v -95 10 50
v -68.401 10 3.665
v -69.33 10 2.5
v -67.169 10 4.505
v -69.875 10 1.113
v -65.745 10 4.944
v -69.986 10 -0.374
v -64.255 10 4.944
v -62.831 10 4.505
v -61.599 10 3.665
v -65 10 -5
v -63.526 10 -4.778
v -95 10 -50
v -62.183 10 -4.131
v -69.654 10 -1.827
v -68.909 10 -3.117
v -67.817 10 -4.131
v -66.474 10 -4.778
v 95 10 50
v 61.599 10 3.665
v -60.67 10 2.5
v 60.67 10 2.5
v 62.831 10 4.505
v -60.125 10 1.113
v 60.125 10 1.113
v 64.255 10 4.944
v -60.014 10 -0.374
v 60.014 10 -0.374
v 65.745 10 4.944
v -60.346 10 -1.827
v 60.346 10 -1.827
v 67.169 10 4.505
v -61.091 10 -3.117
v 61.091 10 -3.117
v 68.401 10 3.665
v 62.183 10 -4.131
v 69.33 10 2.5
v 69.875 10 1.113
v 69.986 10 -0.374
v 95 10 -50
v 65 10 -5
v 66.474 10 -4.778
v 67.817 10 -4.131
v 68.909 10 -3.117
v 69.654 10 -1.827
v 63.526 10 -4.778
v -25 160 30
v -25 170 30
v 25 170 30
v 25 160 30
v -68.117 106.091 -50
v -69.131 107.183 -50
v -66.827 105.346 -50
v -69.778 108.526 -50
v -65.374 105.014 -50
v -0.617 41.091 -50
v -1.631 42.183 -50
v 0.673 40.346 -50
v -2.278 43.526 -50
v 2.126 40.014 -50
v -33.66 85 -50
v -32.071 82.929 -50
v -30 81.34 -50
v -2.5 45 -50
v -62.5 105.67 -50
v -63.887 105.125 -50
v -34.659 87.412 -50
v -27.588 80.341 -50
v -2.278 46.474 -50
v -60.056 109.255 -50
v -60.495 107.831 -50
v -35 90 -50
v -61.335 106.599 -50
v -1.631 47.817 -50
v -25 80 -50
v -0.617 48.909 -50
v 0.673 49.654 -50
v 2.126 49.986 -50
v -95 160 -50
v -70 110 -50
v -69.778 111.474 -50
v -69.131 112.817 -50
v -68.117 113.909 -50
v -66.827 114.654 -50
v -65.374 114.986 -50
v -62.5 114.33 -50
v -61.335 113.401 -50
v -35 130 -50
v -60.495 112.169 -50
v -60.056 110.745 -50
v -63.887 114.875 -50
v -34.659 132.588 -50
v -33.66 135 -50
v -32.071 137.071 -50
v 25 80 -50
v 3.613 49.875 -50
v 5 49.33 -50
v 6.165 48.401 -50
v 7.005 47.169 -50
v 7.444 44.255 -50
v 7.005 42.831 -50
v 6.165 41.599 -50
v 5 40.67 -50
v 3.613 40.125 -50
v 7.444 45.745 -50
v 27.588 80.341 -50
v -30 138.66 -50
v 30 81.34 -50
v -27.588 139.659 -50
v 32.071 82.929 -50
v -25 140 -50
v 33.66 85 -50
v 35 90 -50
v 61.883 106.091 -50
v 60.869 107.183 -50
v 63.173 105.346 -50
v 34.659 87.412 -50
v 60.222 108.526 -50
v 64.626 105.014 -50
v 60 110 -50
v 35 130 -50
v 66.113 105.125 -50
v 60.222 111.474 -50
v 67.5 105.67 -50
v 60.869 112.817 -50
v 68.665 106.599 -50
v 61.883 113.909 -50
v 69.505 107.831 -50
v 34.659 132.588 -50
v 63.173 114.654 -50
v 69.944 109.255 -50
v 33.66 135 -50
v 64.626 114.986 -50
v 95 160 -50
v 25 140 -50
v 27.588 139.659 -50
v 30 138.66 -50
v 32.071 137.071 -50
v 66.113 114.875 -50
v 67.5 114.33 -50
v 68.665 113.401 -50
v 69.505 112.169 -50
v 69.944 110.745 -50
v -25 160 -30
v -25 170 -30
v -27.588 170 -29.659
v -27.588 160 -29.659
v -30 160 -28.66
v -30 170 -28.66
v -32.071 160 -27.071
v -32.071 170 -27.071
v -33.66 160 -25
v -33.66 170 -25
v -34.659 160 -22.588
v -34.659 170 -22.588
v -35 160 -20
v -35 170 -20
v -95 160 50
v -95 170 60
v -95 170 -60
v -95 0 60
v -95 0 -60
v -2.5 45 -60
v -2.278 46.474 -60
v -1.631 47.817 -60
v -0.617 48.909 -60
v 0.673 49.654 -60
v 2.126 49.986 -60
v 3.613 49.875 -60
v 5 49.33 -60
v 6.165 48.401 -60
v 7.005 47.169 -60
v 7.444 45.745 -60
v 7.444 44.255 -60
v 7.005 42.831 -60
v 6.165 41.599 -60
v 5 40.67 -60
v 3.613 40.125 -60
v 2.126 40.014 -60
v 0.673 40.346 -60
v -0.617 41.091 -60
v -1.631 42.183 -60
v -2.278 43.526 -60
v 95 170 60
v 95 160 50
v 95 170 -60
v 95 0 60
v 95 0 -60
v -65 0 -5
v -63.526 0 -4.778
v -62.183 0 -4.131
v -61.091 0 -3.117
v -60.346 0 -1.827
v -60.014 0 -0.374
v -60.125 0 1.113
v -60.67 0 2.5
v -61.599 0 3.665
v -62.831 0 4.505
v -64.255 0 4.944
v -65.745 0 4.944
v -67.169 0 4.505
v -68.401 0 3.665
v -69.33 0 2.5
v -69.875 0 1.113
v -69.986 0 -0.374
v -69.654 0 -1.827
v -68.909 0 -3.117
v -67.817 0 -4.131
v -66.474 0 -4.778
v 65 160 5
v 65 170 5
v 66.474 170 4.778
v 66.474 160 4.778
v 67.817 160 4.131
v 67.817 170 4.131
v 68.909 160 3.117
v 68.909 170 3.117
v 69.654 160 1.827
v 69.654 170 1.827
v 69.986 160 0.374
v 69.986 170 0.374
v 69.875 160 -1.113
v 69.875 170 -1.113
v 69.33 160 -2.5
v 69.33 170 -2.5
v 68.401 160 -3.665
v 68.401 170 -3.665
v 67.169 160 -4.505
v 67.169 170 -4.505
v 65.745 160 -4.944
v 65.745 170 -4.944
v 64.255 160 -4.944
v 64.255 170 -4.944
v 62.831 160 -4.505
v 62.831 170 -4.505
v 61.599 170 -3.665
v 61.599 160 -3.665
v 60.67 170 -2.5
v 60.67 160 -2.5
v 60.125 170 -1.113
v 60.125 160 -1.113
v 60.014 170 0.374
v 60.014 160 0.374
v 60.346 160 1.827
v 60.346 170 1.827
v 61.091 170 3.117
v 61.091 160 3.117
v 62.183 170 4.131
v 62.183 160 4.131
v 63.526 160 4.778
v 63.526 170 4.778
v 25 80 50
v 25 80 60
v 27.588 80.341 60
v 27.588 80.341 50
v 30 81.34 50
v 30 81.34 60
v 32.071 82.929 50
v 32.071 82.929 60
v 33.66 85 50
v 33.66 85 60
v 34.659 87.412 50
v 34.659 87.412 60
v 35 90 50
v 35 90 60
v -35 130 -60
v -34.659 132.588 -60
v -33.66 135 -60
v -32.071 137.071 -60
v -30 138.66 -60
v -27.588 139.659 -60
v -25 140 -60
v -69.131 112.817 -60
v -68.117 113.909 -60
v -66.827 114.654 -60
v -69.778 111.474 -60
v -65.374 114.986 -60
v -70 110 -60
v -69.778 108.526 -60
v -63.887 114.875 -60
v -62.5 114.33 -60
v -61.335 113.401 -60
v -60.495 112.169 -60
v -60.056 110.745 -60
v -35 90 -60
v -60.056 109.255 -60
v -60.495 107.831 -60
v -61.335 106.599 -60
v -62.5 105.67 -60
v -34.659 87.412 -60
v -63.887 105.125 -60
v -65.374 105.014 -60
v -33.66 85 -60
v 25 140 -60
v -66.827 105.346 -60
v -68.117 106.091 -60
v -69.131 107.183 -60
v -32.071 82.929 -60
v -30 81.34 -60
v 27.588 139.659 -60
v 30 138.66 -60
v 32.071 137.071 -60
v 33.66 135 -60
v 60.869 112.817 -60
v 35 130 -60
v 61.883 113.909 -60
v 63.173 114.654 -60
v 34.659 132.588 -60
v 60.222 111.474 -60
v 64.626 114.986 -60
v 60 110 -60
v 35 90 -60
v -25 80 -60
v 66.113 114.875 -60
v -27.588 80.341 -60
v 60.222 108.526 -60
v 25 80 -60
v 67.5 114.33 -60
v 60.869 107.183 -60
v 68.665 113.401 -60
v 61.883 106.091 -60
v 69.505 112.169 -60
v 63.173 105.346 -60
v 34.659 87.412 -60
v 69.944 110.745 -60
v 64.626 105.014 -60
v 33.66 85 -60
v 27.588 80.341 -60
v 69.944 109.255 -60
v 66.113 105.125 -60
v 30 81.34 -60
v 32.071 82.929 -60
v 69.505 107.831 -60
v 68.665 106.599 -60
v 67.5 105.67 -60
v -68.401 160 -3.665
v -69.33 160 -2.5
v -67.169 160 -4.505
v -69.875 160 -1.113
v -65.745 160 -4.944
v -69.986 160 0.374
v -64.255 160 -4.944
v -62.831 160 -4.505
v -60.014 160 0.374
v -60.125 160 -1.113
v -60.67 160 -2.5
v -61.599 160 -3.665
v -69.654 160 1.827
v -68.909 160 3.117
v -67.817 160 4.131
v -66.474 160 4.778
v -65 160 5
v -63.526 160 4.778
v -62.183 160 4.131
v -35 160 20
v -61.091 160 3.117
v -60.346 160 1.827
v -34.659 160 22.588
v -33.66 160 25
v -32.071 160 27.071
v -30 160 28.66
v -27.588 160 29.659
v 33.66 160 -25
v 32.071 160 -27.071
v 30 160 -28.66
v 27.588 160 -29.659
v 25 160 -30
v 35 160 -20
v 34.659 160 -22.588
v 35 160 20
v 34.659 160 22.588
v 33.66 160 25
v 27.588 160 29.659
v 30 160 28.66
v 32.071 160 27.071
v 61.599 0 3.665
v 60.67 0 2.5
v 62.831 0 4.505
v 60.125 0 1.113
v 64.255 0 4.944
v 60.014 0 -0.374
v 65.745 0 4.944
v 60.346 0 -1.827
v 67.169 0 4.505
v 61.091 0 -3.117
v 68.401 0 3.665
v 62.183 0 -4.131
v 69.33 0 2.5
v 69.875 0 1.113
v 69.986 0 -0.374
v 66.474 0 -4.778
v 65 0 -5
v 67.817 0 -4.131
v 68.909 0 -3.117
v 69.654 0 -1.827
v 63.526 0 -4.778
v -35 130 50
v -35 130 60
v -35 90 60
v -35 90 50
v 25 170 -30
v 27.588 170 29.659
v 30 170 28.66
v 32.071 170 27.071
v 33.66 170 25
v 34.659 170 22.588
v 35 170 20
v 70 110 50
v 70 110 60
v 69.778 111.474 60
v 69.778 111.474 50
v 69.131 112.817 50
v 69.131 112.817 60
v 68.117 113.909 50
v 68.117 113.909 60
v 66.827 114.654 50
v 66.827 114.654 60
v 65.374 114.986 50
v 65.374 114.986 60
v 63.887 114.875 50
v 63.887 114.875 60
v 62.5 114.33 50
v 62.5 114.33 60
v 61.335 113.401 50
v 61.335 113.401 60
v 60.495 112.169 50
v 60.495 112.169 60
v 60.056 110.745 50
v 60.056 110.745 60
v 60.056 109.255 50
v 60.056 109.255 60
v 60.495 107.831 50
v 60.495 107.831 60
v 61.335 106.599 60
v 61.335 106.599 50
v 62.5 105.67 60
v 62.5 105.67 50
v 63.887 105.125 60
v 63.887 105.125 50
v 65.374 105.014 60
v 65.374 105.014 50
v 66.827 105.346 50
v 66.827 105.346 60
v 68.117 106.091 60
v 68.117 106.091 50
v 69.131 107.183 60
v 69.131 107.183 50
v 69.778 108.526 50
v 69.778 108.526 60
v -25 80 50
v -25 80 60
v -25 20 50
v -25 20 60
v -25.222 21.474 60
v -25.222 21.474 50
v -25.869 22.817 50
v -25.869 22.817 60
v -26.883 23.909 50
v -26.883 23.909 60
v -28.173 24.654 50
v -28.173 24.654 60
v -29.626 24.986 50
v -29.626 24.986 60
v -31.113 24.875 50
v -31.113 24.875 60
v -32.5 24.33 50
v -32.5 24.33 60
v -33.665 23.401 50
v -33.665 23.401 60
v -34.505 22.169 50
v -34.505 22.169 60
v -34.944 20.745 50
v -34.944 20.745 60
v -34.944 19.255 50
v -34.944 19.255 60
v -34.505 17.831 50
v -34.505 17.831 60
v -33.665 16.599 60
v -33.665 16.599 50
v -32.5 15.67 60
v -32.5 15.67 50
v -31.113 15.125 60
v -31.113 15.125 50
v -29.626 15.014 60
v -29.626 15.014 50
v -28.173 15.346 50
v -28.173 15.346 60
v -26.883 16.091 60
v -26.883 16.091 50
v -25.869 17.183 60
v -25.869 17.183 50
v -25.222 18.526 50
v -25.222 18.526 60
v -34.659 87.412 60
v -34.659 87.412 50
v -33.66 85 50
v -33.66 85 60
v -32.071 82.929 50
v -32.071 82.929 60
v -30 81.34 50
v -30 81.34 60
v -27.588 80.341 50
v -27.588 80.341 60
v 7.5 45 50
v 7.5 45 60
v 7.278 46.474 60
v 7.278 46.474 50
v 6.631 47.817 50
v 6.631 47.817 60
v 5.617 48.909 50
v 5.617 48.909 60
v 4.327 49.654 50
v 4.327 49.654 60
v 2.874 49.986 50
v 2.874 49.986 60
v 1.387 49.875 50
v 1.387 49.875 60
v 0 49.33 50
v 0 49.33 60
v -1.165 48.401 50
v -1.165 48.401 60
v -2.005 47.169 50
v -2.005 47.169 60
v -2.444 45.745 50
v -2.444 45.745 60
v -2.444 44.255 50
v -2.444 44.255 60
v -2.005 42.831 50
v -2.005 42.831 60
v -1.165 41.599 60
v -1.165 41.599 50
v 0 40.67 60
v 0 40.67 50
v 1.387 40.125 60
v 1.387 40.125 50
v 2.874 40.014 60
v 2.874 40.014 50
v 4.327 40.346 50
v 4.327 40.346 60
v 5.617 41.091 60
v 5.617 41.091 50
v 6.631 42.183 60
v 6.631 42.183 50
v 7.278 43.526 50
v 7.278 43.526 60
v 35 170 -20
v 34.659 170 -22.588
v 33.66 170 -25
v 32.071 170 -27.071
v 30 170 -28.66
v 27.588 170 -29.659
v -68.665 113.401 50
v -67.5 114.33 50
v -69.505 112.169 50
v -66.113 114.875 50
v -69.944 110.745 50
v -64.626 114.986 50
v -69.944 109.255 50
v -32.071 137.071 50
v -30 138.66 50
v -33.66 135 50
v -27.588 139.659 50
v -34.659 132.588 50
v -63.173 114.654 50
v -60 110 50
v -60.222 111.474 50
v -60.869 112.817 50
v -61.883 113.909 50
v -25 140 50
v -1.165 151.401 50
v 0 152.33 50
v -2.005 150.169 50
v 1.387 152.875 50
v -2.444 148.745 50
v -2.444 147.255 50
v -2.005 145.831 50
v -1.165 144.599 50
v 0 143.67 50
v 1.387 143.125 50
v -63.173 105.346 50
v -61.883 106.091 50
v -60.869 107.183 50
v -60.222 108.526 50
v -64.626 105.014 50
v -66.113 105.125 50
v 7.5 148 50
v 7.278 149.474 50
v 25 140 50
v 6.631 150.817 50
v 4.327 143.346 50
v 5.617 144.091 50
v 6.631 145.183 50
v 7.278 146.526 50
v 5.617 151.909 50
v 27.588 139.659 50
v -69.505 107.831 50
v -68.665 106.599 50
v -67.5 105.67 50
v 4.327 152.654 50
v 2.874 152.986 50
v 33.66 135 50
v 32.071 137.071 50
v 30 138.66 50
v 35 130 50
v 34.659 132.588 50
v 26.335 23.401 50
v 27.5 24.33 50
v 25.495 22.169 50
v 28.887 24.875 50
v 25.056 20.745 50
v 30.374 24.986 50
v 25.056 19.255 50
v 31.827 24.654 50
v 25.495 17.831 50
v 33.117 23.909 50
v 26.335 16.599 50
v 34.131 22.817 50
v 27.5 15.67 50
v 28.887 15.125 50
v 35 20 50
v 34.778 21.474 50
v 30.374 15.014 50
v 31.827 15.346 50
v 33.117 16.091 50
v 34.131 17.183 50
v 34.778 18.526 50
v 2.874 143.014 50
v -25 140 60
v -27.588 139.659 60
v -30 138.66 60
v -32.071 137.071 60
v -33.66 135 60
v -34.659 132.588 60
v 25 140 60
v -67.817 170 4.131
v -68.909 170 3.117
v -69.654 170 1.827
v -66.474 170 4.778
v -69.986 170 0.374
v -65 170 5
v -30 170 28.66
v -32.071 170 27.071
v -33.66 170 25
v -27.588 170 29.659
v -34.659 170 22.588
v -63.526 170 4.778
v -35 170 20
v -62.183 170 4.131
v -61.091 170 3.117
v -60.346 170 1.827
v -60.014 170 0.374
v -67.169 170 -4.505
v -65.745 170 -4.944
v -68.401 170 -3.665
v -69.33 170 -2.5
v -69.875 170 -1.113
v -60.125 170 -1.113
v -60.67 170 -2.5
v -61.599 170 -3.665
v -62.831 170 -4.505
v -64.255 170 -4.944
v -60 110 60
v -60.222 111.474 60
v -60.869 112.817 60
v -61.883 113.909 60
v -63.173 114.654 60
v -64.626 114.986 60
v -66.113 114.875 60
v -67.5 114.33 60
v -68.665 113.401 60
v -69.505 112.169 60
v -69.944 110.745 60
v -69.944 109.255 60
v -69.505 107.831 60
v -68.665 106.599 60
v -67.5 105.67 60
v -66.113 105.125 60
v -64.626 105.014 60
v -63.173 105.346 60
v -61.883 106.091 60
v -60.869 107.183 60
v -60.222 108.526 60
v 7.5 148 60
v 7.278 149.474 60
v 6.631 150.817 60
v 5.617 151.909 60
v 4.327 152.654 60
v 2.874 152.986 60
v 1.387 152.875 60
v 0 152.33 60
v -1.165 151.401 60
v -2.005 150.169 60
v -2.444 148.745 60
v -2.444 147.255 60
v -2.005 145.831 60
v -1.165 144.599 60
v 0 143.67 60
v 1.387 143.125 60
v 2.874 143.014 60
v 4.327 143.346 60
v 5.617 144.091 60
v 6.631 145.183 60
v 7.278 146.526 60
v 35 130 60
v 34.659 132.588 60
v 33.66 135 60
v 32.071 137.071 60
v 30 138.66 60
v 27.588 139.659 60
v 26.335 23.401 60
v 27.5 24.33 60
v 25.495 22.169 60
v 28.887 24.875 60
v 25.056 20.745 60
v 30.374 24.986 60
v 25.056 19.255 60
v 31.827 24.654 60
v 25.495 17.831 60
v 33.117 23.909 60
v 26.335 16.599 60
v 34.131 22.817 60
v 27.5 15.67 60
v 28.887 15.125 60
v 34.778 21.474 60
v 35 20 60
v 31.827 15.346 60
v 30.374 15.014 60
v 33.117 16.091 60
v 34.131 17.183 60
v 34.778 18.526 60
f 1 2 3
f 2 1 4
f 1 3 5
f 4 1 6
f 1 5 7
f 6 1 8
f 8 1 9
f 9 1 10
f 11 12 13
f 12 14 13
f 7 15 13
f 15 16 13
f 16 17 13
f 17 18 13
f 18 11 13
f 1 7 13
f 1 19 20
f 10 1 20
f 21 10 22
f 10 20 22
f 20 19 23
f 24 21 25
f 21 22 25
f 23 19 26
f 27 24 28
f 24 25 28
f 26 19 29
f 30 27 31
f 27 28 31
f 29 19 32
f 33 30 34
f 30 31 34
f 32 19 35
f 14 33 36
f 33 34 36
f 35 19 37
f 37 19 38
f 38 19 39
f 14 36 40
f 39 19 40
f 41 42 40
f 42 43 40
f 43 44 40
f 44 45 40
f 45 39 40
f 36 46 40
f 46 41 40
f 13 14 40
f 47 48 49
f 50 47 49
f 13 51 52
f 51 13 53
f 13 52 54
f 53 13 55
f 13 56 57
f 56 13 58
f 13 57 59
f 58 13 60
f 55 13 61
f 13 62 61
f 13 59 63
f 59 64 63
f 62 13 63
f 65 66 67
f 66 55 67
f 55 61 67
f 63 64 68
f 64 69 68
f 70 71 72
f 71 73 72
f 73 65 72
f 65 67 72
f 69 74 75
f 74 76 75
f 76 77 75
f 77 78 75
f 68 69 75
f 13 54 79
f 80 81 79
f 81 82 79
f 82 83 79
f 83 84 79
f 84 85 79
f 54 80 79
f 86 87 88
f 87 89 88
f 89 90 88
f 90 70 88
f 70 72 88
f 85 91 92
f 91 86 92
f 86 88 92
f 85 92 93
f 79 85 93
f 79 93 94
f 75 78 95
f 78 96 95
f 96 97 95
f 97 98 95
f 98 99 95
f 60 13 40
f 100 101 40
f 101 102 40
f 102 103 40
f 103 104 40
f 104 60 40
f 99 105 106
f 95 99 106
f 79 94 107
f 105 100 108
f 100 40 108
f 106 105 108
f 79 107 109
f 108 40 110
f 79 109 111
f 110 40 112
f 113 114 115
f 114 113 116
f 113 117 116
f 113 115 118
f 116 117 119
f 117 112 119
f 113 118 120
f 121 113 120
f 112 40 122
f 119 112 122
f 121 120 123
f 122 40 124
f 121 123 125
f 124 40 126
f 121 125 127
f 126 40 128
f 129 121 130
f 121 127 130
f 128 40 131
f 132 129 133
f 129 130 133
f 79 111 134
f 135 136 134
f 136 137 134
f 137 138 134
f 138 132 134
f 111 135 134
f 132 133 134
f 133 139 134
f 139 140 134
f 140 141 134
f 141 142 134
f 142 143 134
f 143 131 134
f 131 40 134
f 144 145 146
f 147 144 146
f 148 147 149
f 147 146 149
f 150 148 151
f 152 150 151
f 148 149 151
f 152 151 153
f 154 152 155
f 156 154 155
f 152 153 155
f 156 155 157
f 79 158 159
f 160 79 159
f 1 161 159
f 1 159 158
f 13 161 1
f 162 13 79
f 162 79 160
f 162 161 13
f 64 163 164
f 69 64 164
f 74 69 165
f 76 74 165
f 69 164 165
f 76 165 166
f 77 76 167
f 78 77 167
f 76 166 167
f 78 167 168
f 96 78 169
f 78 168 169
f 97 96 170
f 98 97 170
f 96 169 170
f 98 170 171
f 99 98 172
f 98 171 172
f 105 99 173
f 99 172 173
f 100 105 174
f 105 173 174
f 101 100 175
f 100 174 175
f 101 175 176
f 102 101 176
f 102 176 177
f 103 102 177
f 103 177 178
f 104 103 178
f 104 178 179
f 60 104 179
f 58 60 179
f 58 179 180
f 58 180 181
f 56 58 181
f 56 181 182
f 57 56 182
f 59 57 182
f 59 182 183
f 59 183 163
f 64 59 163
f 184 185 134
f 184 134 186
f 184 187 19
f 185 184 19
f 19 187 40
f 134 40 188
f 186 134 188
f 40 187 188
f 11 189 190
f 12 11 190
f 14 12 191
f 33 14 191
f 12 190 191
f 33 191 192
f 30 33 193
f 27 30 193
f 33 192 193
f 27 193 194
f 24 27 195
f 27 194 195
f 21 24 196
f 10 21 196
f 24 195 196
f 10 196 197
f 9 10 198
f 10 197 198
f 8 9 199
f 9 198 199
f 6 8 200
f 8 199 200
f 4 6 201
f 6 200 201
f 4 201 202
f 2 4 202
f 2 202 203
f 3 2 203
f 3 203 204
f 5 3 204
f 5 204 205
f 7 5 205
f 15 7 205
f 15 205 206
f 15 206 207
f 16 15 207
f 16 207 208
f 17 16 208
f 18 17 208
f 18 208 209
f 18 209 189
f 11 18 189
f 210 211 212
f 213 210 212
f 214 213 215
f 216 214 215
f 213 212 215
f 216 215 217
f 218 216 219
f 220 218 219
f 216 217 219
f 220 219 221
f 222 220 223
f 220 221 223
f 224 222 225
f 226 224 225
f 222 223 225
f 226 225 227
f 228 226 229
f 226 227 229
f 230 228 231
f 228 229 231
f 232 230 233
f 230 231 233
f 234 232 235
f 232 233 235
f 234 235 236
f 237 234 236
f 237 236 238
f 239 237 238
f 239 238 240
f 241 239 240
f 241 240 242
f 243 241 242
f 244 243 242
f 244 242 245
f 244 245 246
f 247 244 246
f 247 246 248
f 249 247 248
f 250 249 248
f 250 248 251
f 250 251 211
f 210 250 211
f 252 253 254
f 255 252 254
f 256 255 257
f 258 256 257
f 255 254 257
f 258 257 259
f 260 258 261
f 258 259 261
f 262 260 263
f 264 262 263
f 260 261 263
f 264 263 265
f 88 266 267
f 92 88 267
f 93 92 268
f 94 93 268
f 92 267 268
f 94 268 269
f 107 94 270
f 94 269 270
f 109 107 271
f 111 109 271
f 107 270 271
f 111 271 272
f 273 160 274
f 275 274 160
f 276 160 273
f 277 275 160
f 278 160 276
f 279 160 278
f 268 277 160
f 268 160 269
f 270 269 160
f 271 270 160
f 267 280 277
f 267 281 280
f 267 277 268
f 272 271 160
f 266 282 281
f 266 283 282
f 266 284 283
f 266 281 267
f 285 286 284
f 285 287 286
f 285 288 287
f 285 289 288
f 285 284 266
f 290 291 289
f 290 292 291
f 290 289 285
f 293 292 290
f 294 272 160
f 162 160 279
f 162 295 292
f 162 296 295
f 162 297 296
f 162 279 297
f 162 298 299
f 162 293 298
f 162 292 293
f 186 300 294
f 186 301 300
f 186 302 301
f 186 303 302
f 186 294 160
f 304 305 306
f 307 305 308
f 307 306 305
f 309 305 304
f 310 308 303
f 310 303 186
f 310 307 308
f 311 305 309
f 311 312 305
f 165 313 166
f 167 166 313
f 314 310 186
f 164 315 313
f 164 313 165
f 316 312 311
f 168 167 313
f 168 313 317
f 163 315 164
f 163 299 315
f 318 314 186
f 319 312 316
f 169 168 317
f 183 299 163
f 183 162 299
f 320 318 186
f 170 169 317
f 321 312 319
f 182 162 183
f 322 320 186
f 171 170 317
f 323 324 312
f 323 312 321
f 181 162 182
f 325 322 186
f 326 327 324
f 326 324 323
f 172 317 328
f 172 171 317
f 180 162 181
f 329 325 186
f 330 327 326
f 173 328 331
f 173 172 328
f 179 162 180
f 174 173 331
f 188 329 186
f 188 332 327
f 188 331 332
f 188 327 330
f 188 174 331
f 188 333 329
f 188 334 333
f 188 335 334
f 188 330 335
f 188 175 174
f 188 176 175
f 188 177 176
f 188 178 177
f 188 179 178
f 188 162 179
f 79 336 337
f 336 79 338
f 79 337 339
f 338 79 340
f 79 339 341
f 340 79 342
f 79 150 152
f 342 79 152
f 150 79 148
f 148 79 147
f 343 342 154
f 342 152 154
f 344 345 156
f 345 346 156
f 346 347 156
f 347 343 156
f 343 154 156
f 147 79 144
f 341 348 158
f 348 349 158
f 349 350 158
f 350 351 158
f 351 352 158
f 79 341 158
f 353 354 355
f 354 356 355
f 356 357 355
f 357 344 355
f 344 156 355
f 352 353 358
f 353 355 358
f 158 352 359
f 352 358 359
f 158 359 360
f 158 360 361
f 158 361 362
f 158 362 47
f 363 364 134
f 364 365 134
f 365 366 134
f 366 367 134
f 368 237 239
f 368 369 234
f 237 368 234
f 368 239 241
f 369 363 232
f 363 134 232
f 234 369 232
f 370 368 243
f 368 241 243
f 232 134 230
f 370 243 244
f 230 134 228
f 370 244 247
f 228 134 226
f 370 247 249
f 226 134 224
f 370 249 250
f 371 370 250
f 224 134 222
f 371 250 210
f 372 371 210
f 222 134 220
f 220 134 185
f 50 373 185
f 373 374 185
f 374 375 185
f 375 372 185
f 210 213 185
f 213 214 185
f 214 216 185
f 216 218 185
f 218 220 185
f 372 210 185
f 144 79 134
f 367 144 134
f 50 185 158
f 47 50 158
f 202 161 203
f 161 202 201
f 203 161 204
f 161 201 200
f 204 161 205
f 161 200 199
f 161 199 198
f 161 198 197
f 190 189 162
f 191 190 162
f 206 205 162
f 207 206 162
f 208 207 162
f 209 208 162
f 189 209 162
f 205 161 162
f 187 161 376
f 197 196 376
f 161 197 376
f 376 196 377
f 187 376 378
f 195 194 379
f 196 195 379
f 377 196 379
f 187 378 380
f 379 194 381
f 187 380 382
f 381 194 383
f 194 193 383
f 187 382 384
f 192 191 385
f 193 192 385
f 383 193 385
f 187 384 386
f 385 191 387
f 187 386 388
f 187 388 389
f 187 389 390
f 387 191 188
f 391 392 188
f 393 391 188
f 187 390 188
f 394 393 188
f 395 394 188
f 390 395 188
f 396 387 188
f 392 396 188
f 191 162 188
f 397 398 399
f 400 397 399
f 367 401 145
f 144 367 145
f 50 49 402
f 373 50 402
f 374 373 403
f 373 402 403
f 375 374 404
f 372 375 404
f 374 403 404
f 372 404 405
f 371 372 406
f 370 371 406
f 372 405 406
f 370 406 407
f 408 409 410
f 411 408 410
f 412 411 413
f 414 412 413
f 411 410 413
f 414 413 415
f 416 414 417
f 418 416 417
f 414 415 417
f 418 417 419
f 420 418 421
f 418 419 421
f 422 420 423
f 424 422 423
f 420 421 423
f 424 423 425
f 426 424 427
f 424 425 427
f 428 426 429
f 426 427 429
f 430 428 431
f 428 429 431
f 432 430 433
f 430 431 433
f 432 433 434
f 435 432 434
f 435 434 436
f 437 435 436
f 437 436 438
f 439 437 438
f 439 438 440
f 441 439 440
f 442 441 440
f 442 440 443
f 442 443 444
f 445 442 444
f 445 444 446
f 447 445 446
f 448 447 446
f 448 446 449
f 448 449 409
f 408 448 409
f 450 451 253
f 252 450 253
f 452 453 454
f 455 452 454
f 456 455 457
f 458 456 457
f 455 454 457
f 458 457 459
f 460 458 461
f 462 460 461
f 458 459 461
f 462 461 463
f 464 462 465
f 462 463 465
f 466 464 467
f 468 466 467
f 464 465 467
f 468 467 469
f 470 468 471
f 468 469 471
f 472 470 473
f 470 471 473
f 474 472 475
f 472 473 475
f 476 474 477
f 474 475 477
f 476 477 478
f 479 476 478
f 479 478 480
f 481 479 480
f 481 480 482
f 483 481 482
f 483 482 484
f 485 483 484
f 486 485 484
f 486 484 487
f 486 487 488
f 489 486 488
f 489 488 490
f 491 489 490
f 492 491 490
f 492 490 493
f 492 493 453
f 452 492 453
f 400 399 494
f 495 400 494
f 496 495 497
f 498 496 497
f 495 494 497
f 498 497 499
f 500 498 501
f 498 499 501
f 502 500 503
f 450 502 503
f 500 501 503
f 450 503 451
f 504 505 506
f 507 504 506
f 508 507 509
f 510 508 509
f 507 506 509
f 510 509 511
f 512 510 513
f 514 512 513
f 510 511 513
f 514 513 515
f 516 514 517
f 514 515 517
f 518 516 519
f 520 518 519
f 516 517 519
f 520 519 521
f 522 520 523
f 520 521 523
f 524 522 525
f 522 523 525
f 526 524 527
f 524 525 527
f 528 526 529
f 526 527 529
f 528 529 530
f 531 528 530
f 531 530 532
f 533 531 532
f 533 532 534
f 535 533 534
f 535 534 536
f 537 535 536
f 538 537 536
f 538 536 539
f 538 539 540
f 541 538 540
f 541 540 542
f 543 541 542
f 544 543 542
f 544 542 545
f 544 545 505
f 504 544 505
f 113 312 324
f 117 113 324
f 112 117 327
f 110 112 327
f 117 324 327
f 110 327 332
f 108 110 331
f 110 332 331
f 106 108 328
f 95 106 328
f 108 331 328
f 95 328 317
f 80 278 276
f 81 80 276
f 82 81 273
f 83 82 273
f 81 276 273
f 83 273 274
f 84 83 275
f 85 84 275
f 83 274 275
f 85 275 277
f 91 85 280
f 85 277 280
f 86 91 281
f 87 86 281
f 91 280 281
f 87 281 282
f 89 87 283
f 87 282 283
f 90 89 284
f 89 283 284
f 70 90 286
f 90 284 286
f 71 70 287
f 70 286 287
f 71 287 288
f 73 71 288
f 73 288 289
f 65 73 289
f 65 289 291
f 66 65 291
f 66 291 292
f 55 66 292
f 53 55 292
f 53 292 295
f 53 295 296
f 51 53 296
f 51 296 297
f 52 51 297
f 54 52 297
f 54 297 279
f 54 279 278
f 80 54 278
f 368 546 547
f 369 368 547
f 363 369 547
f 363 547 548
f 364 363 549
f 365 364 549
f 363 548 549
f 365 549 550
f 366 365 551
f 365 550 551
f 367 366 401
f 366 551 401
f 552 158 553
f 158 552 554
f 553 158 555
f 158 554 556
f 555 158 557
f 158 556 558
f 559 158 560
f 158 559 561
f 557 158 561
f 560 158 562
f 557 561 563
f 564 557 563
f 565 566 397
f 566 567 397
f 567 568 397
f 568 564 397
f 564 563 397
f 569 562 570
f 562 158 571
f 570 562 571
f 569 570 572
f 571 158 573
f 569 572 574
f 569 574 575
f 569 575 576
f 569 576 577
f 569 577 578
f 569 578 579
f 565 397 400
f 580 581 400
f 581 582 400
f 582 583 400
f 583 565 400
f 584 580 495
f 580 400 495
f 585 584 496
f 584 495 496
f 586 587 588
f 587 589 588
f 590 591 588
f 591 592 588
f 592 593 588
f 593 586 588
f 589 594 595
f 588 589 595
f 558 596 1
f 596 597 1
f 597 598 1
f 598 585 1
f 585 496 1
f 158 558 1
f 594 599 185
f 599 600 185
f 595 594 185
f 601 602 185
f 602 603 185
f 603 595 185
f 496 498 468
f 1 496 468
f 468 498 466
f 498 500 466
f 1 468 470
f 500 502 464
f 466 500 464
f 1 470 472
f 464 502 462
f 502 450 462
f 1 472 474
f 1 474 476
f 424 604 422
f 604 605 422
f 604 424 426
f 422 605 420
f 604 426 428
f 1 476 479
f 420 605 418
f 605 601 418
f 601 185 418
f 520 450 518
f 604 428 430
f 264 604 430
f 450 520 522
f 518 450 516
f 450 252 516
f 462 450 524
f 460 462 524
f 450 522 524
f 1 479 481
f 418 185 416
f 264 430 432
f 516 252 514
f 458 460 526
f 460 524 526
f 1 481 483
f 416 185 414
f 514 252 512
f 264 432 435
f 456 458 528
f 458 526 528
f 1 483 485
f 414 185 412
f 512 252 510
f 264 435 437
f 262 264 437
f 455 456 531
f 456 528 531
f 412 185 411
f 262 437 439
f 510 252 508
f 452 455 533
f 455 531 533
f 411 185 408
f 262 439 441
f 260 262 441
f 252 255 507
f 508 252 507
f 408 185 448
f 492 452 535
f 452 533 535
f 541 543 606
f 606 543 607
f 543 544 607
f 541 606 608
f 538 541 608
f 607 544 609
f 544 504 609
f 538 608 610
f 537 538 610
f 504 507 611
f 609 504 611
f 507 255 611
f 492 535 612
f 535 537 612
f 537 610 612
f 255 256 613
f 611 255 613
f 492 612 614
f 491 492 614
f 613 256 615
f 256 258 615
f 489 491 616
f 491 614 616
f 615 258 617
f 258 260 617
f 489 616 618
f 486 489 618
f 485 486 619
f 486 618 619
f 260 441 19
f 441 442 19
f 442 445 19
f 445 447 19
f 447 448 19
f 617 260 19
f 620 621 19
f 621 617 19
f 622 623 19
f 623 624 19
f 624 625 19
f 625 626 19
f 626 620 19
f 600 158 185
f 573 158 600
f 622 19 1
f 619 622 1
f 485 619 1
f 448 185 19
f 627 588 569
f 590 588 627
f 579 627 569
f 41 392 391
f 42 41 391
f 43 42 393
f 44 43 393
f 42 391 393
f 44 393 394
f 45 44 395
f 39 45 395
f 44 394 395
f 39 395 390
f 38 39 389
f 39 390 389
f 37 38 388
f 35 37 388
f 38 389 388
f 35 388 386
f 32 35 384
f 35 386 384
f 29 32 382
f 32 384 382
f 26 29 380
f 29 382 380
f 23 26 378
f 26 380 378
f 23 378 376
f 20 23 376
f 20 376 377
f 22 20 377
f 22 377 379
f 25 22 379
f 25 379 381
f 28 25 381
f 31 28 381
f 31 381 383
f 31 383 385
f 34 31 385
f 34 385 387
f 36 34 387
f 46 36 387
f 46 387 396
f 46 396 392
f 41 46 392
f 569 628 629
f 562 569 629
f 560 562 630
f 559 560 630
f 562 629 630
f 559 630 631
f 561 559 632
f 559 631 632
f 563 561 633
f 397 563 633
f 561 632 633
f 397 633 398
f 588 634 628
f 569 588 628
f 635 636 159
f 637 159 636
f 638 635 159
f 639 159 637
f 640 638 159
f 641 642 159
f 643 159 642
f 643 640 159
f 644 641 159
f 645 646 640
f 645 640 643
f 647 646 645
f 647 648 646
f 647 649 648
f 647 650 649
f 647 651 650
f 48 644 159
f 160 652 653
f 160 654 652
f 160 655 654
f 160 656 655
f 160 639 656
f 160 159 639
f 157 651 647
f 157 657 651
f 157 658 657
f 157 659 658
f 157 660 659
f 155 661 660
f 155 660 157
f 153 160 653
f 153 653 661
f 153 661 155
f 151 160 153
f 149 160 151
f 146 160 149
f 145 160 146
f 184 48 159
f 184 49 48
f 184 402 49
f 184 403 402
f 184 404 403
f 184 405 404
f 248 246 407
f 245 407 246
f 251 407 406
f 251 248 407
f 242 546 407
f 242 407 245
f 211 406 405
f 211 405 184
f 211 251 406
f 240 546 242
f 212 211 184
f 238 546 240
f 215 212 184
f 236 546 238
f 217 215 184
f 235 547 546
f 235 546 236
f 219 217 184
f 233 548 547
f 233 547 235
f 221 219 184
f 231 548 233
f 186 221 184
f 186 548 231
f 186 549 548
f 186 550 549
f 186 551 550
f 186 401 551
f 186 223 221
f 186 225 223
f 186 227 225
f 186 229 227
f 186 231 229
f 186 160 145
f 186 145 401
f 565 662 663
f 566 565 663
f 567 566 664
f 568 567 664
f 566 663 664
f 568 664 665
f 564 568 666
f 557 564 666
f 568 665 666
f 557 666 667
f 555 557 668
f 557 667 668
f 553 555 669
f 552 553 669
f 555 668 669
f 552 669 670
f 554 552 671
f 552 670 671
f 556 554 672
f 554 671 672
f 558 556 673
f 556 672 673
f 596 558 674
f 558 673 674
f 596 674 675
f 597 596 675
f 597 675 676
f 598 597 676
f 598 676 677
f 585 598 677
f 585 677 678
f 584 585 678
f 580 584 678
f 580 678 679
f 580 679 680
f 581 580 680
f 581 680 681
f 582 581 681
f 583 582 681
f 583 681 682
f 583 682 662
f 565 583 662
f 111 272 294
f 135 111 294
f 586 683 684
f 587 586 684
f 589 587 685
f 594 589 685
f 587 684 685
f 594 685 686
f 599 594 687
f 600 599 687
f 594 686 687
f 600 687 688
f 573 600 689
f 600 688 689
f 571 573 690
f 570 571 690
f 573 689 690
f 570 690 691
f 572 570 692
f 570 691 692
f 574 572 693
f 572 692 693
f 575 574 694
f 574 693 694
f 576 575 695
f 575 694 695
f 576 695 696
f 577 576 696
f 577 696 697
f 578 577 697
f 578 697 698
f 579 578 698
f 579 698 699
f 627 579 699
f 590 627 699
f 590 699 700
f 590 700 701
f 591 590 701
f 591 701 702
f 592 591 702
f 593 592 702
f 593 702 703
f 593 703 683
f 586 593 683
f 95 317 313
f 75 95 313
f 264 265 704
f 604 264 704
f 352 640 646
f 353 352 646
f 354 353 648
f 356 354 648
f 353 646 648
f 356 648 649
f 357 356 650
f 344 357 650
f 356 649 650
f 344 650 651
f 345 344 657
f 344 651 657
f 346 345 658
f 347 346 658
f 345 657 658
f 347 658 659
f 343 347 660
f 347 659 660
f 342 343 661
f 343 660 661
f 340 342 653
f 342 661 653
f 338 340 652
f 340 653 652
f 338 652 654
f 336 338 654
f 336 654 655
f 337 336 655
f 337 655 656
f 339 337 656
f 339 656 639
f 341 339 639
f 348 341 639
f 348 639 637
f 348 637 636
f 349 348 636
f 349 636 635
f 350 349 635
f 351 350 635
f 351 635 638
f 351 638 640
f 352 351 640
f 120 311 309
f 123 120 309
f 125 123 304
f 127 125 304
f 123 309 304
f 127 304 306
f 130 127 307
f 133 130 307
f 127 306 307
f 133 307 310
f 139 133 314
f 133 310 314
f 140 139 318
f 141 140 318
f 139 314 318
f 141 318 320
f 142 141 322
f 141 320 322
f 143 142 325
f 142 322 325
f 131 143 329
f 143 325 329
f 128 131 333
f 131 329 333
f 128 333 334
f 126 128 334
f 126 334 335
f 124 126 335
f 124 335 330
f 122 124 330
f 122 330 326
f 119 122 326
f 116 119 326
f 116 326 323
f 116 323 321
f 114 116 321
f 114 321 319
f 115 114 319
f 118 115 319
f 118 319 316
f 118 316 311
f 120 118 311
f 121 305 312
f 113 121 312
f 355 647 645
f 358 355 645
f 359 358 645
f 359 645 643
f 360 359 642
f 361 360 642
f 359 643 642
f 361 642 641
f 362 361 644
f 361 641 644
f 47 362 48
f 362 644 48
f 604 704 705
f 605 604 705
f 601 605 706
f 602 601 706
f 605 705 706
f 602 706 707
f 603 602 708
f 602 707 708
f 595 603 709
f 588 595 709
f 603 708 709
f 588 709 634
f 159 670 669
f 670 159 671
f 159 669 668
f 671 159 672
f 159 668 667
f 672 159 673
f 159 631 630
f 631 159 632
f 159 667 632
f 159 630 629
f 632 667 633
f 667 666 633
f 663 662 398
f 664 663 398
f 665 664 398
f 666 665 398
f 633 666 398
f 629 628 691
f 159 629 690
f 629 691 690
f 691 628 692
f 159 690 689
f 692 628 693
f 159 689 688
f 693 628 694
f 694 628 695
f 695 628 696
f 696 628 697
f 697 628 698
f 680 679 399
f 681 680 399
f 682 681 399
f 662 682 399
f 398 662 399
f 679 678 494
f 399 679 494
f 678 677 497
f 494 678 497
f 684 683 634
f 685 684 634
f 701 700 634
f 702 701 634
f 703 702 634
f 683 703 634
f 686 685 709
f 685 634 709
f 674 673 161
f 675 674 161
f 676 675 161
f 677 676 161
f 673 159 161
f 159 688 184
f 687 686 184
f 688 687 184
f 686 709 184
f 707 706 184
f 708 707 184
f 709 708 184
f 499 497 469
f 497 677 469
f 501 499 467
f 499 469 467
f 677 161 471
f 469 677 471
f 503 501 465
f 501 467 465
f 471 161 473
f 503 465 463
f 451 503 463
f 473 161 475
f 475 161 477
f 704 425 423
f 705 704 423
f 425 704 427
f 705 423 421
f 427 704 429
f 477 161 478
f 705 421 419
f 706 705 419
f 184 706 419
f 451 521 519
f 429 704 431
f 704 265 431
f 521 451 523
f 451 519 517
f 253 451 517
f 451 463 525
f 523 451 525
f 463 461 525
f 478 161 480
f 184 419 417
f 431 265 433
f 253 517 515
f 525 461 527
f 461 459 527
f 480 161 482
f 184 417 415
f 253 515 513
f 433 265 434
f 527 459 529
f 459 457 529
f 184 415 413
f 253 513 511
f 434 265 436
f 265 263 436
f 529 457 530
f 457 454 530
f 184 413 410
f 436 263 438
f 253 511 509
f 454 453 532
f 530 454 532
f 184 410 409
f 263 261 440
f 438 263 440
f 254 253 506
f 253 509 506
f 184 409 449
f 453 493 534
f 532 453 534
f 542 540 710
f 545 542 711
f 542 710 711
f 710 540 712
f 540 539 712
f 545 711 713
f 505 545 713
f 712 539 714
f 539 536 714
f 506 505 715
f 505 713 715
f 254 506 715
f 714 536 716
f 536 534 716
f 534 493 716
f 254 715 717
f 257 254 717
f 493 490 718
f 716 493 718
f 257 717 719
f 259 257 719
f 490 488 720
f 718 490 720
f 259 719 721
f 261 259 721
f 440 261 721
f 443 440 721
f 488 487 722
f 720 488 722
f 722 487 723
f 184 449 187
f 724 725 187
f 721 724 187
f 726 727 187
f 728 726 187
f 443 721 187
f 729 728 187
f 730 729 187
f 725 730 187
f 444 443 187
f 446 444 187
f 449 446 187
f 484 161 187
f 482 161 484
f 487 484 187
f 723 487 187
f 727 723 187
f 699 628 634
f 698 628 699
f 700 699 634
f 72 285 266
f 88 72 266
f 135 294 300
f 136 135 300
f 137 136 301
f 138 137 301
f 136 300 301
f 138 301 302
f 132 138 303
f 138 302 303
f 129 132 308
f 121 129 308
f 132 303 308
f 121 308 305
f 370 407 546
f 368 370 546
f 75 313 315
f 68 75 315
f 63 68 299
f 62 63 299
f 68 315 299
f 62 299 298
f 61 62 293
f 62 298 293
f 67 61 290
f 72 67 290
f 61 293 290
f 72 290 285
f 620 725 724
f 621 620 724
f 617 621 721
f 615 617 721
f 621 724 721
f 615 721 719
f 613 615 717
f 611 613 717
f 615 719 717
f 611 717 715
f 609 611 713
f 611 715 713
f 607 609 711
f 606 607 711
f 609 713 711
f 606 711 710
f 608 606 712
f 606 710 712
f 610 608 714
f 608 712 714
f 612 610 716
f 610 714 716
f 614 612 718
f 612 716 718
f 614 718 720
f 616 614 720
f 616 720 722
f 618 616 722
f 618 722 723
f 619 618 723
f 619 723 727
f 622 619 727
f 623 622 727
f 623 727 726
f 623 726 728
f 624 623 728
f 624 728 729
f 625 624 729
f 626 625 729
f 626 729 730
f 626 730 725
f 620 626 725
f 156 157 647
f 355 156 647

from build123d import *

# Parameters (mm, degrees)
SKETCH1_W                        = 190
SKETCH1_H                        = 120
BOSS_EXTRUDE1_DEPTH              = 170
SKETCH2_W                        = 50
SKETCH2_H                        = 75
CUT_EXTRUDE1_DEPTH               = 190
CUT_EXTRUDE2_DEPTH               = 15
CUT_EXTRUDE3_DEPTH               = 15
CUT_EXTRUDE4_DEPTH               = 15
M10X1_0_TAPPED_HOLE1_D           = 9
M10X1_0_TAPPED_HOLE1_DEPTH       = 23
M10X1_0_TAPPED_HOLE1_CBORE_D     = 10
M10X1_0_TAPPED_HOLE1_CBORE_DEPTH = 20
M10X1_0_TAPPED_HOLE1_TIP         = 2.703872786
M10X1_0_TAPPED_HOLE2_D           = 9
M10X1_0_TAPPED_HOLE2_DEPTH       = 23
M10X1_0_TAPPED_HOLE2_CBORE_D     = 10
M10X1_0_TAPPED_HOLE2_CBORE_DEPTH = 20
M10X1_0_TAPPED_HOLE2_TIP         = 2.703872786
M10X1_0_TAPPED_HOLE3_D           = 9
M10X1_0_TAPPED_HOLE3_DEPTH       = 23
M10X1_0_TAPPED_HOLE3_CBORE_D     = 10
M10X1_0_TAPPED_HOLE3_CBORE_DEPTH = 20
M10X1_0_TAPPED_HOLE3_TIP         = 2.703872786
M10X1_0_TAPPED_HOLE4_D           = 9
M10X1_0_TAPPED_HOLE4_DEPTH       = 23
M10X1_0_TAPPED_HOLE4_CBORE_D     = 10
M10X1_0_TAPPED_HOLE4_CBORE_DEPTH = 20
M10X1_0_TAPPED_HOLE4_TIP         = 2.703872786
M10X1_0_TAPPED_HOLE5_D           = 9
M10X1_0_TAPPED_HOLE5_DEPTH       = 23
M10X1_0_TAPPED_HOLE5_CBORE_D     = 10
M10X1_0_TAPPED_HOLE5_CBORE_DEPTH = 20
M10X1_0_TAPPED_HOLE5_TIP         = 2.703872786


with BuildPart() as part:
    # Sketch1 → Boss-Extrude1 (new body)
    with BuildSketch(Plane(origin=(0, 0, 0), x_dir=(1, 0, 0), z_dir=(0, 1, 0))):
        Rectangle(SKETCH1_W, SKETCH1_H)
    extrude(amount=BOSS_EXTRUDE1_DEPTH)

    # Sketch2 → Cut-Extrude1 (cut)
    with BuildSketch(Plane(origin=(95, 0, 0), x_dir=(0, 0, -1), z_dir=(1, 0, 0))):
        with Locations((-25, 122.5)):
            Rectangle(SKETCH2_W, SKETCH2_H)
        with Locations((25, 122.5)):
            Rectangle(SKETCH2_W, SKETCH2_H)
        with Locations((25, 47.5)):
            Rectangle(SKETCH2_W, SKETCH2_H)
        with Locations((-25, 47.5)):
            Rectangle(SKETCH2_W, SKETCH2_H)
    extrude(amount=-CUT_EXTRUDE1_DEPTH, mode=Mode.SUBTRACT)

    # Sketch3 → Cut-Extrude2 (cut)
    with BuildSketch(Plane.XY.offset(60)):
        with BuildLine():
            Line((-25, 80), (25, 80))
            ThreePointArc((25, 80), (32.071067812, 82.928932188), (35, 90))
            Line((35, 90), (35, 130))
            ThreePointArc((35, 130), (32.071067812, 137.071067812), (25, 140))
            Line((25, 140), (-25, 140))
            ThreePointArc((-25, 140), (-32.071067812, 137.071067812), (-35, 130))
            Line((-35, 130), (-35, 90))
            ThreePointArc((-35, 90), (-32.071067812, 82.928932188), (-25, 80))
        make_face()
    extrude(amount=-CUT_EXTRUDE2_DEPTH, mode=Mode.SUBTRACT)

    # Sketch4 → Cut-Extrude3 (cut)
    with BuildSketch(Plane(origin=(0, 0, -60), x_dir=(-1, 0, 0), z_dir=(0, 0, -1))):
        with BuildLine():
            Line((-25, 80), (25, 80))
            ThreePointArc((25, 80), (32.071067812, 82.928932188), (35, 90))
            Line((35, 90), (35, 130))
            ThreePointArc((35, 130), (32.071067812, 137.071067812), (25, 140))
            Line((25, 140), (-25, 140))
            ThreePointArc((-25, 140), (-32.071067812, 137.071067812), (-35, 130))
            Line((-35, 130), (-35, 90))
            ThreePointArc((-35, 90), (-32.071067812, 82.928932188), (-25, 80))
        make_face()
    extrude(amount=-CUT_EXTRUDE3_DEPTH, mode=Mode.SUBTRACT)

    # Sketch5 → Cut-Extrude4 (cut)
    with BuildSketch(Plane(origin=(0, 170, 0), x_dir=(1, 0, 0), z_dir=(0, 1, 0))):
        with BuildLine():
            Line((-25, -30), (25, -30))
            ThreePointArc((25, -30), (32.071067812, -27.071067812), (35, -20))
            Line((35, -20), (35, 20))
            ThreePointArc((35, 20), (32.071067812, 27.071067812), (25, 30))
            Line((25, 30), (-25, 30))
            ThreePointArc((-25, 30), (-32.071067812, 27.071067812), (-35, 20))
            Line((-35, 20), (-35, -20))
            ThreePointArc((-35, -20), (-32.071067812, -27.071067812), (-25, -30))
        make_face()
    extrude(amount=-CUT_EXTRUDE4_DEPTH, mode=Mode.SUBTRACT)

    # M10x1.0 Tapped Hole1
    with Locations(Plane(origin=(65, 110, -70), x_dir=(-1, 0, 0), z_dir=(0, 0, -1))):
        with Locations((0, 0), (130, 0), (62.5, -65)):
            CounterBoreHole(M10X1_0_TAPPED_HOLE1_D / 2, M10X1_0_TAPPED_HOLE1_CBORE_D / 2, M10X1_0_TAPPED_HOLE1_CBORE_DEPTH, depth=M10X1_0_TAPPED_HOLE1_DEPTH)
            with Locations((0, 0, -(M10X1_0_TAPPED_HOLE1_DEPTH + M10X1_0_TAPPED_HOLE1_TIP / 2))):  # 118° drill point
                Cone(0, M10X1_0_TAPPED_HOLE1_D / 2, M10X1_0_TAPPED_HOLE1_TIP, mode=Mode.SUBTRACT)

    # M10x1.0 Tapped Hole2
    with Locations(Plane(origin=(-65, 170, 0), x_dir=(0, 0, 1), z_dir=(0, 1, 0))):
        with Locations((0, 0), (0, 130)):
            CounterBoreHole(M10X1_0_TAPPED_HOLE2_D / 2, M10X1_0_TAPPED_HOLE2_CBORE_D / 2, M10X1_0_TAPPED_HOLE2_CBORE_DEPTH, depth=M10X1_0_TAPPED_HOLE2_DEPTH)
            with Locations((0, 0, -(M10X1_0_TAPPED_HOLE2_DEPTH + M10X1_0_TAPPED_HOLE2_TIP / 2))):  # 118° drill point
                Cone(0, M10X1_0_TAPPED_HOLE2_D / 2, M10X1_0_TAPPED_HOLE2_TIP, mode=Mode.SUBTRACT)

    # M10x1.0 Tapped Hole3
    with Locations(Plane(origin=(-65, 110, 60), x_dir=(1, 0, 0), z_dir=(0, 0, 1))):
        with Locations((0, 0), (130, 0), (67.5, -65), (67.5, 38)):
            CounterBoreHole(M10X1_0_TAPPED_HOLE3_D / 2, M10X1_0_TAPPED_HOLE3_CBORE_D / 2, M10X1_0_TAPPED_HOLE3_CBORE_DEPTH, depth=M10X1_0_TAPPED_HOLE3_DEPTH)
            with Locations((0, 0, -(M10X1_0_TAPPED_HOLE3_DEPTH + M10X1_0_TAPPED_HOLE3_TIP / 2))):  # 118° drill point
                Cone(0, M10X1_0_TAPPED_HOLE3_D / 2, M10X1_0_TAPPED_HOLE3_TIP, mode=Mode.SUBTRACT)

    # M10x1.0 Tapped Hole4
    with Locations(Plane(origin=(65, 0, 0), x_dir=(0, 0, -1), z_dir=(0, -1, 0))):
        with Locations((0, 0), (0, -130)):
            CounterBoreHole(M10X1_0_TAPPED_HOLE4_D / 2, M10X1_0_TAPPED_HOLE4_CBORE_D / 2, M10X1_0_TAPPED_HOLE4_CBORE_DEPTH, depth=M10X1_0_TAPPED_HOLE4_DEPTH)
            with Locations((0, 0, -(M10X1_0_TAPPED_HOLE4_DEPTH + M10X1_0_TAPPED_HOLE4_TIP / 2))):  # 118° drill point
                Cone(0, M10X1_0_TAPPED_HOLE4_D / 2, M10X1_0_TAPPED_HOLE4_TIP, mode=Mode.SUBTRACT)

    # M10x1.0 Tapped Hole5
    with Locations(Plane(origin=(-30, 20, 60), x_dir=(1, 0, 0), z_dir=(0, 0, 1))):
        with Locations((0, 0), (60, 0)):
            CounterBoreHole(M10X1_0_TAPPED_HOLE5_D / 2, M10X1_0_TAPPED_HOLE5_CBORE_D / 2, M10X1_0_TAPPED_HOLE5_CBORE_DEPTH, depth=M10X1_0_TAPPED_HOLE5_DEPTH)
            with Locations((0, 0, -(M10X1_0_TAPPED_HOLE5_DEPTH + M10X1_0_TAPPED_HOLE5_TIP / 2))):  # 118° drill point
                Cone(0, M10X1_0_TAPPED_HOLE5_D / 2, M10X1_0_TAPPED_HOLE5_TIP, mode=Mode.SUBTRACT)


solid = part.part
